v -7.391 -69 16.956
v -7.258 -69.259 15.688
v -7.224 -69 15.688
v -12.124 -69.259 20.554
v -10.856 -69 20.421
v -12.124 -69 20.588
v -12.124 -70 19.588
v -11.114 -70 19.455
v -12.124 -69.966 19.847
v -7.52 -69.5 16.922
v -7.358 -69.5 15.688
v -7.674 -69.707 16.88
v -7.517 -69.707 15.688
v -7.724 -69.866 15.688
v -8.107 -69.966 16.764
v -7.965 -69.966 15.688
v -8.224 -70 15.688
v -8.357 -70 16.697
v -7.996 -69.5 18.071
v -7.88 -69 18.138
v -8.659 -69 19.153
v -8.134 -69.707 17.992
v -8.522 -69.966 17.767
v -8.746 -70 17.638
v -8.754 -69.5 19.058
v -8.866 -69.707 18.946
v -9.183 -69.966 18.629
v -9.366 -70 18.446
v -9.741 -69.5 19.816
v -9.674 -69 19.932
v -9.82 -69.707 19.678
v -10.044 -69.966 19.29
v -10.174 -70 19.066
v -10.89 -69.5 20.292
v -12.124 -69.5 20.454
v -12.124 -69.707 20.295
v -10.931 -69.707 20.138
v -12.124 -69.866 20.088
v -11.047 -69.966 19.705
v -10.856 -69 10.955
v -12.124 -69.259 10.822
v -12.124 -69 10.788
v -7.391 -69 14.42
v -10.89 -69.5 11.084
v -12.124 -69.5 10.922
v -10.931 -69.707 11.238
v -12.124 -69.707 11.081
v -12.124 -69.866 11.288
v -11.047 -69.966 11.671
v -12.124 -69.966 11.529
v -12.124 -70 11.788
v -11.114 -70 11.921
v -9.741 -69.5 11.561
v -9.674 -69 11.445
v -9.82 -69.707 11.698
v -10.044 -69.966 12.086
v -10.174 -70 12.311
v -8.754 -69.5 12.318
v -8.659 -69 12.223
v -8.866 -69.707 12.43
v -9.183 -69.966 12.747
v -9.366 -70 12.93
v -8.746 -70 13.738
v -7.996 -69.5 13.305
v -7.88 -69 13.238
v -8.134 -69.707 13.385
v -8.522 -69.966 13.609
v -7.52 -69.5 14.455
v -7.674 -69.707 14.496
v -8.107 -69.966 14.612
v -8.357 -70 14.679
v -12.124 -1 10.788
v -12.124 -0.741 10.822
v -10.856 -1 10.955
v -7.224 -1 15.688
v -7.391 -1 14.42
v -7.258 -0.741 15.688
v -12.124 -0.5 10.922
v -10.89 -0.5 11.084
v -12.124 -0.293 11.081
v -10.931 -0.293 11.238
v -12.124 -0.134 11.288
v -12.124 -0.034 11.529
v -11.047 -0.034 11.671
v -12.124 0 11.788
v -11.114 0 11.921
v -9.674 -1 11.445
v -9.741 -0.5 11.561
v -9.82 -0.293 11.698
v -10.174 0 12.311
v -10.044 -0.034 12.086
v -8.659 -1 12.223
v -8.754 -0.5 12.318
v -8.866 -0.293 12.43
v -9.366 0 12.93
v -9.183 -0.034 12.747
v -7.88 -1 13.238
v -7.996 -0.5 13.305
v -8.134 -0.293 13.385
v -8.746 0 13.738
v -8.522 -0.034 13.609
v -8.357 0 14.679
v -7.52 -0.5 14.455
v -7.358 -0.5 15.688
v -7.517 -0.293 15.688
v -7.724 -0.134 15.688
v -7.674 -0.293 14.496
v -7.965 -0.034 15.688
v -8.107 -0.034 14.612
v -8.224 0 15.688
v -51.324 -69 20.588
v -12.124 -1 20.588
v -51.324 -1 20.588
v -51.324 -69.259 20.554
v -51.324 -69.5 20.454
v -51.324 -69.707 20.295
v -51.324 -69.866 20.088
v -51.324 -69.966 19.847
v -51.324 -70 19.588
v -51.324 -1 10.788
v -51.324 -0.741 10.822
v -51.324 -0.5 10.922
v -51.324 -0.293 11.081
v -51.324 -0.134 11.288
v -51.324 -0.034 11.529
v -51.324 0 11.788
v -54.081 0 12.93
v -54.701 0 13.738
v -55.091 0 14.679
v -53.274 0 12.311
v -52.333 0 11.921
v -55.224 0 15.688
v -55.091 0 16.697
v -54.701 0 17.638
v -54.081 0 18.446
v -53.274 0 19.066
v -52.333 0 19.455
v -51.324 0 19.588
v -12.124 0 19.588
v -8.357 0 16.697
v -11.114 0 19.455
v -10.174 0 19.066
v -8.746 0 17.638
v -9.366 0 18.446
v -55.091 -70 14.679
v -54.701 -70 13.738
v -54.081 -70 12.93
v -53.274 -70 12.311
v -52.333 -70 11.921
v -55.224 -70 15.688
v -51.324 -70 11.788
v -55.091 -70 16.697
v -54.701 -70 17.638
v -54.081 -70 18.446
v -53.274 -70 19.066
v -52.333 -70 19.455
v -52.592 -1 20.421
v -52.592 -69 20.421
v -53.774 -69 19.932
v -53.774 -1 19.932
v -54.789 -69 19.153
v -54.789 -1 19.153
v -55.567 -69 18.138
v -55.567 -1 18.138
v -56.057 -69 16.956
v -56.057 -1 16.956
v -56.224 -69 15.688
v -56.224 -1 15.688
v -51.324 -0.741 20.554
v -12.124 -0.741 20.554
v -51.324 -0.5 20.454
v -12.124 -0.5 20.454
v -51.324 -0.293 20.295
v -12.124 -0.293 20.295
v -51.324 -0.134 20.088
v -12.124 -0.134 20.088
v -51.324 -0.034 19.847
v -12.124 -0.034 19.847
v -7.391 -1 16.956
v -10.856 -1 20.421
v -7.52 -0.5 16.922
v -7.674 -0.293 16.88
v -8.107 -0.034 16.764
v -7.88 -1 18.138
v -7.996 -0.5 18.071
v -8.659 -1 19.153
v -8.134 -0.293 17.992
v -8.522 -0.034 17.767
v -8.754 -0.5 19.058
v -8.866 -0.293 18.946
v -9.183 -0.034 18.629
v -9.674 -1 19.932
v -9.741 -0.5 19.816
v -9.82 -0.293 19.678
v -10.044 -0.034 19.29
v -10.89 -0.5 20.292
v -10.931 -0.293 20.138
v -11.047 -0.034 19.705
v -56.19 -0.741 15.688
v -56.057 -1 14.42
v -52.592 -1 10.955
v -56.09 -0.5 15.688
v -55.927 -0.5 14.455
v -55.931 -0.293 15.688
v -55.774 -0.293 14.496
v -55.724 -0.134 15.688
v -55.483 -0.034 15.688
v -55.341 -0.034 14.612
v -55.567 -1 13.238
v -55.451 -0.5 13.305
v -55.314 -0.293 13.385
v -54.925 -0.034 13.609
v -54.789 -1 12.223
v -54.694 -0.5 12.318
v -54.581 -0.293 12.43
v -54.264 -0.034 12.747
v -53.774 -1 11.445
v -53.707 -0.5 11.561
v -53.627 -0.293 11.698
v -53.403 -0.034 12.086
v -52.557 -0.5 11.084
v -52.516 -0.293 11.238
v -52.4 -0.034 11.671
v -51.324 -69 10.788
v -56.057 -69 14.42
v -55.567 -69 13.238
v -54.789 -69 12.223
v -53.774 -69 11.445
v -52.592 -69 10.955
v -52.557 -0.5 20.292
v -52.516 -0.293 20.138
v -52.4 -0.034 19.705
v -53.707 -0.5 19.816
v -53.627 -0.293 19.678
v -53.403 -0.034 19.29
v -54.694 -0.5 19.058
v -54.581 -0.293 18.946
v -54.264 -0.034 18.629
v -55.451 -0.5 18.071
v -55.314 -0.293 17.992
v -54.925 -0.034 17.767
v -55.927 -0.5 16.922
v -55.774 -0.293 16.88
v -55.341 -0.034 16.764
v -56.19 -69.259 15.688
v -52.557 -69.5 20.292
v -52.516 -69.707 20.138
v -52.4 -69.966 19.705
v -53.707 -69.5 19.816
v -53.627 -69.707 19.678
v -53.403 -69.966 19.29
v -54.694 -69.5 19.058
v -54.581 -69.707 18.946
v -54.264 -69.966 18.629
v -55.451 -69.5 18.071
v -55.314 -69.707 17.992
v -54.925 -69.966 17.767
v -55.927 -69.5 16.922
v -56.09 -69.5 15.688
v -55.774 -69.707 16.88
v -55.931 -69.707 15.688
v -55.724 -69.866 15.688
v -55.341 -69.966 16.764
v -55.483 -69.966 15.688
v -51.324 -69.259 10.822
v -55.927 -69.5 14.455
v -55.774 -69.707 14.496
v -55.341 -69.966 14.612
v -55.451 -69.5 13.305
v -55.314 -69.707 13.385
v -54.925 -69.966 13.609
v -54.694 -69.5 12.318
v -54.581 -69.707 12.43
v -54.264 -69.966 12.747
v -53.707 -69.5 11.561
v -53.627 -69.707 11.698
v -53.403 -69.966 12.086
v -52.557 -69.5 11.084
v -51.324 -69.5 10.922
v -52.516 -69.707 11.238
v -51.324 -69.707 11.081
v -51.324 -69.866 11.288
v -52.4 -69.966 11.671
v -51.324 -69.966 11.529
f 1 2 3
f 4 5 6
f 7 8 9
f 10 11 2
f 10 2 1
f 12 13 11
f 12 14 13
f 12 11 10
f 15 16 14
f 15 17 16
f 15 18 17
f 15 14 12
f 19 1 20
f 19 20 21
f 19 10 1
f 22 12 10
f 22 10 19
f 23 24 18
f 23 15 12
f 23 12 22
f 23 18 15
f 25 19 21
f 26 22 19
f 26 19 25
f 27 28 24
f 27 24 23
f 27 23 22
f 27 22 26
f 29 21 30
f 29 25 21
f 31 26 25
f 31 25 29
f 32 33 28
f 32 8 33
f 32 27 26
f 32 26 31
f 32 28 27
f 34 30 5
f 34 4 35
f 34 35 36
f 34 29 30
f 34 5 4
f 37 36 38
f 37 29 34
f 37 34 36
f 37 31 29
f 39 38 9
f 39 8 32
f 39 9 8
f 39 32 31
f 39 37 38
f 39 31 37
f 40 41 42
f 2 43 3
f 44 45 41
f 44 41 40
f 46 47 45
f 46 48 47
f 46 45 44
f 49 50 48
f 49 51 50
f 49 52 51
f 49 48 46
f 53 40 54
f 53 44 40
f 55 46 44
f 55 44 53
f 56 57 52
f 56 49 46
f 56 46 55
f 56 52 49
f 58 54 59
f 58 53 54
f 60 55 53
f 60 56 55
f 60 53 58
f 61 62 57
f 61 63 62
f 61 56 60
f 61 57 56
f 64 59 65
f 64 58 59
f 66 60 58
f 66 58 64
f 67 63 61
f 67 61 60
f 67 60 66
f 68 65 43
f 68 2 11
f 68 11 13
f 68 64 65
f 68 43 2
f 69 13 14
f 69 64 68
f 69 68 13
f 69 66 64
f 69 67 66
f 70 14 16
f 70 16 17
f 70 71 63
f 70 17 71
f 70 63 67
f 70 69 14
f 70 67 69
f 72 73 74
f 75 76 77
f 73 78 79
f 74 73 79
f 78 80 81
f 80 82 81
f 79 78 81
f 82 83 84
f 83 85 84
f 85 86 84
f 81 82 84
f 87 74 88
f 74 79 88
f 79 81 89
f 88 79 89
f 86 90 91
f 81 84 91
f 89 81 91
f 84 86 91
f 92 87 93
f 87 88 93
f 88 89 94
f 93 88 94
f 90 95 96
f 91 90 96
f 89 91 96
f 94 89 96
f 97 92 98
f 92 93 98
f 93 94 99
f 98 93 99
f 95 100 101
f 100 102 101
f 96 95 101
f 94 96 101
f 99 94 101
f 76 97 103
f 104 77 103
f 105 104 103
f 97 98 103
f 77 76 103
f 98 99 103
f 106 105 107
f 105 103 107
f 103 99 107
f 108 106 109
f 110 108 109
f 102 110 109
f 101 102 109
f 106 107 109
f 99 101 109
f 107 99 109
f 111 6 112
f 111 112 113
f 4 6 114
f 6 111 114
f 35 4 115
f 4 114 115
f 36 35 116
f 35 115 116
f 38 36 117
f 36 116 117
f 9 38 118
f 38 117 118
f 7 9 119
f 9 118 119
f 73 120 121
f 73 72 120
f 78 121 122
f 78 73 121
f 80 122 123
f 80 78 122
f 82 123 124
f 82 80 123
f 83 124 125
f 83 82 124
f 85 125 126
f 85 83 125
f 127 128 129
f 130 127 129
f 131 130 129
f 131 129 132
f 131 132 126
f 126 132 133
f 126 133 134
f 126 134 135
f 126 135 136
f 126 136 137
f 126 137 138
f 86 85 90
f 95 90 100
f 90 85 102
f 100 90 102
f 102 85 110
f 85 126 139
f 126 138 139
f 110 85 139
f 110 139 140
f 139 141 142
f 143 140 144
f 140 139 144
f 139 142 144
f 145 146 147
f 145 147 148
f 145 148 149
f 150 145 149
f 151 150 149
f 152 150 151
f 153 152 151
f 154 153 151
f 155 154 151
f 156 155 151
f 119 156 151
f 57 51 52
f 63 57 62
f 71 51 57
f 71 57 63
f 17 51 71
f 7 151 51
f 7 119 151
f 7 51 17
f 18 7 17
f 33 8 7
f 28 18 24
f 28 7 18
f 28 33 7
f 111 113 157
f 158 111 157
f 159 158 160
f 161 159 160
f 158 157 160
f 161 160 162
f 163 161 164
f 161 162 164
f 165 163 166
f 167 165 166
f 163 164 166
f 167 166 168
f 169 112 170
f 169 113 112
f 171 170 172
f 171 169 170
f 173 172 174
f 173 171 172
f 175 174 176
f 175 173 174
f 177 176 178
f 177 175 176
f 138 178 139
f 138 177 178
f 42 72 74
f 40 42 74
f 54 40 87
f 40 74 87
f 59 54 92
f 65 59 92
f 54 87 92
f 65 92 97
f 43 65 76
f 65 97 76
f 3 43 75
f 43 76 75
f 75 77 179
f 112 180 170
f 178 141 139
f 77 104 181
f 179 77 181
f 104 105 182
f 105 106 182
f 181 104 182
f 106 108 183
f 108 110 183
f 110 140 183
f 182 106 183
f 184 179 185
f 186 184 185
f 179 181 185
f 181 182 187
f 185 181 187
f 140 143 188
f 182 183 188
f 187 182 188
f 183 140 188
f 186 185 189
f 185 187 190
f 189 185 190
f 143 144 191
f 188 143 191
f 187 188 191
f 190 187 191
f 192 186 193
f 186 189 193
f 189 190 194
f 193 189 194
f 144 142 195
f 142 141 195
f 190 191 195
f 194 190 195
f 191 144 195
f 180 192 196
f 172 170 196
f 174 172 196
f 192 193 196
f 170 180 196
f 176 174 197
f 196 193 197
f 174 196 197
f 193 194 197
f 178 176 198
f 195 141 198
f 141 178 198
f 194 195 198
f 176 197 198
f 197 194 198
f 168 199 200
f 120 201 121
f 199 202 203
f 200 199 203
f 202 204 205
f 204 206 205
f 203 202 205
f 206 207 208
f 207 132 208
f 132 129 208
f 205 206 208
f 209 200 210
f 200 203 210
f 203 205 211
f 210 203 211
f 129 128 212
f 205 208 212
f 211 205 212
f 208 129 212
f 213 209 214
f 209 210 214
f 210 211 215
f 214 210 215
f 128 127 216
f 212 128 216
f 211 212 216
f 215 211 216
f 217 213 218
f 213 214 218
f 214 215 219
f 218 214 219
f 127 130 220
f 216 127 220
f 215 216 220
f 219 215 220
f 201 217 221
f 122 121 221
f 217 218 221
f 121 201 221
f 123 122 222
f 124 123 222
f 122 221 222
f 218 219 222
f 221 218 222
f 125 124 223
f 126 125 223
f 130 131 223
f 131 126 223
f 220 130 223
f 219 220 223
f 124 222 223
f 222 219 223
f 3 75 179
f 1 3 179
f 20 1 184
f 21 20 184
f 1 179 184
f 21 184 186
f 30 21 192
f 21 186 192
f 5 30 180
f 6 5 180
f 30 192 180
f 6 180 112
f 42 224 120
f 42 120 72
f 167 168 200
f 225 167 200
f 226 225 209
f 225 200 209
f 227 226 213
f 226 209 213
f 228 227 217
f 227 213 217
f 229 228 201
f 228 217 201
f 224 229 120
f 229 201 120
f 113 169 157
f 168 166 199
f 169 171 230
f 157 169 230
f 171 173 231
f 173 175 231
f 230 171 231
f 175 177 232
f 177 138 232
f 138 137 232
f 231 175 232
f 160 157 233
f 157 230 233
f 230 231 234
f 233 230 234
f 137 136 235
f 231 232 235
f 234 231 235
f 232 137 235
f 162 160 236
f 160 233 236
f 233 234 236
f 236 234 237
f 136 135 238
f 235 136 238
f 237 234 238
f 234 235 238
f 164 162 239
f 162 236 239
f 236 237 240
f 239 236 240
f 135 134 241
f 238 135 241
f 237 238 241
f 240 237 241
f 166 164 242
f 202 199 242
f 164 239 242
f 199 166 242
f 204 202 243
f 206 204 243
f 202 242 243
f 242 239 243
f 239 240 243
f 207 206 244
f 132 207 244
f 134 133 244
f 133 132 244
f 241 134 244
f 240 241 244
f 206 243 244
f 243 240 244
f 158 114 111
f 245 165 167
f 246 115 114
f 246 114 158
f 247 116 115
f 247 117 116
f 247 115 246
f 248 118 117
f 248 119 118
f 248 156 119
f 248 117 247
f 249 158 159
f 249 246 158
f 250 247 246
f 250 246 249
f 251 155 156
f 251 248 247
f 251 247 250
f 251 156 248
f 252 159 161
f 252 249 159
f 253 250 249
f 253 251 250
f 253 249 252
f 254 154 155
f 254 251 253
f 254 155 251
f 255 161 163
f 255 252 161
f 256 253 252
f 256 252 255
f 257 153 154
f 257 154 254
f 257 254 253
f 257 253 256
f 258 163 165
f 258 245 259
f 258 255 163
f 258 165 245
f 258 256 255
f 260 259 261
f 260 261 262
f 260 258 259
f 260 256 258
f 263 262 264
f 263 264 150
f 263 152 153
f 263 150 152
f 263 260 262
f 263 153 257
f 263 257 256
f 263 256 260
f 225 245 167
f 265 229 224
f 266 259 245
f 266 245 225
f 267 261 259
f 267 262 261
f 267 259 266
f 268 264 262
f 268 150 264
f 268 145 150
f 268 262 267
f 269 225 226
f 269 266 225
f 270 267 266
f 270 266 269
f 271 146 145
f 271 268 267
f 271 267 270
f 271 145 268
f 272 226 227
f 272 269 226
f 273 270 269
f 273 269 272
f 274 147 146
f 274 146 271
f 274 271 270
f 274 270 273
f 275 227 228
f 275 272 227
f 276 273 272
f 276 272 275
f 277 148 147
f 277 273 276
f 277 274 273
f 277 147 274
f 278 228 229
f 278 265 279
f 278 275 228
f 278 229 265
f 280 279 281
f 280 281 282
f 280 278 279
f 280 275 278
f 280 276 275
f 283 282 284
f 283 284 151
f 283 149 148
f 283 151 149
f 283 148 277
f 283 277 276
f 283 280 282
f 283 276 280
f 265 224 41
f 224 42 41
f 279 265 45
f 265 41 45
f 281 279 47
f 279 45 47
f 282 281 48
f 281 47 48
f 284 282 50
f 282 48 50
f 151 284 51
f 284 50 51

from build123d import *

# Parameters (mm, degrees)
F1_DEPTH = 70
F2_R     = 1


with BuildPart() as f1:
    # F0 (on Front) → F1 (new body)
    with BuildSketch(Plane.XZ):
        with BuildLine():
            Line((-12.123742, 20.588074), (-51.323742, 20.588074))
            ThreePointArc((-51.323742, 20.588074), (-54.788565, 19.152897), (-56.223742, 15.688074))
            ThreePointArc((-56.223742, 15.688074), (-54.788565, 12.22325), (-51.323742, 10.788074))
            Line((-51.323742, 10.788074), (-12.123742, 10.788074))
            ThreePointArc((-12.123742, 10.788074), (-8.658918, 12.22325), (-7.223742, 15.688074))
            ThreePointArc((-7.223742, 15.688074), (-8.658918, 19.152897), (-12.123742, 20.588074))
        make_face()
    extrude(amount=F1_DEPTH)

    # F2
    f2_edges = [f1.edges().sort_by_distance(p)[0] for p in [
        (-31.723742, -70, 20.588074),
        (-56.223742, -70, 15.688074),
        (-31.723742, -70, 10.788074),
        (-7.223742, -70, 15.688074),
        (-56.223742, 0, 15.688074),
        (-31.723742, 0, 20.588074),
        (-31.723742, 0, 10.788074),
        (-7.223742, 0, 15.688074),
    ]]
    fillet(f2_edges, radius=F2_R)


solid = f1.part
